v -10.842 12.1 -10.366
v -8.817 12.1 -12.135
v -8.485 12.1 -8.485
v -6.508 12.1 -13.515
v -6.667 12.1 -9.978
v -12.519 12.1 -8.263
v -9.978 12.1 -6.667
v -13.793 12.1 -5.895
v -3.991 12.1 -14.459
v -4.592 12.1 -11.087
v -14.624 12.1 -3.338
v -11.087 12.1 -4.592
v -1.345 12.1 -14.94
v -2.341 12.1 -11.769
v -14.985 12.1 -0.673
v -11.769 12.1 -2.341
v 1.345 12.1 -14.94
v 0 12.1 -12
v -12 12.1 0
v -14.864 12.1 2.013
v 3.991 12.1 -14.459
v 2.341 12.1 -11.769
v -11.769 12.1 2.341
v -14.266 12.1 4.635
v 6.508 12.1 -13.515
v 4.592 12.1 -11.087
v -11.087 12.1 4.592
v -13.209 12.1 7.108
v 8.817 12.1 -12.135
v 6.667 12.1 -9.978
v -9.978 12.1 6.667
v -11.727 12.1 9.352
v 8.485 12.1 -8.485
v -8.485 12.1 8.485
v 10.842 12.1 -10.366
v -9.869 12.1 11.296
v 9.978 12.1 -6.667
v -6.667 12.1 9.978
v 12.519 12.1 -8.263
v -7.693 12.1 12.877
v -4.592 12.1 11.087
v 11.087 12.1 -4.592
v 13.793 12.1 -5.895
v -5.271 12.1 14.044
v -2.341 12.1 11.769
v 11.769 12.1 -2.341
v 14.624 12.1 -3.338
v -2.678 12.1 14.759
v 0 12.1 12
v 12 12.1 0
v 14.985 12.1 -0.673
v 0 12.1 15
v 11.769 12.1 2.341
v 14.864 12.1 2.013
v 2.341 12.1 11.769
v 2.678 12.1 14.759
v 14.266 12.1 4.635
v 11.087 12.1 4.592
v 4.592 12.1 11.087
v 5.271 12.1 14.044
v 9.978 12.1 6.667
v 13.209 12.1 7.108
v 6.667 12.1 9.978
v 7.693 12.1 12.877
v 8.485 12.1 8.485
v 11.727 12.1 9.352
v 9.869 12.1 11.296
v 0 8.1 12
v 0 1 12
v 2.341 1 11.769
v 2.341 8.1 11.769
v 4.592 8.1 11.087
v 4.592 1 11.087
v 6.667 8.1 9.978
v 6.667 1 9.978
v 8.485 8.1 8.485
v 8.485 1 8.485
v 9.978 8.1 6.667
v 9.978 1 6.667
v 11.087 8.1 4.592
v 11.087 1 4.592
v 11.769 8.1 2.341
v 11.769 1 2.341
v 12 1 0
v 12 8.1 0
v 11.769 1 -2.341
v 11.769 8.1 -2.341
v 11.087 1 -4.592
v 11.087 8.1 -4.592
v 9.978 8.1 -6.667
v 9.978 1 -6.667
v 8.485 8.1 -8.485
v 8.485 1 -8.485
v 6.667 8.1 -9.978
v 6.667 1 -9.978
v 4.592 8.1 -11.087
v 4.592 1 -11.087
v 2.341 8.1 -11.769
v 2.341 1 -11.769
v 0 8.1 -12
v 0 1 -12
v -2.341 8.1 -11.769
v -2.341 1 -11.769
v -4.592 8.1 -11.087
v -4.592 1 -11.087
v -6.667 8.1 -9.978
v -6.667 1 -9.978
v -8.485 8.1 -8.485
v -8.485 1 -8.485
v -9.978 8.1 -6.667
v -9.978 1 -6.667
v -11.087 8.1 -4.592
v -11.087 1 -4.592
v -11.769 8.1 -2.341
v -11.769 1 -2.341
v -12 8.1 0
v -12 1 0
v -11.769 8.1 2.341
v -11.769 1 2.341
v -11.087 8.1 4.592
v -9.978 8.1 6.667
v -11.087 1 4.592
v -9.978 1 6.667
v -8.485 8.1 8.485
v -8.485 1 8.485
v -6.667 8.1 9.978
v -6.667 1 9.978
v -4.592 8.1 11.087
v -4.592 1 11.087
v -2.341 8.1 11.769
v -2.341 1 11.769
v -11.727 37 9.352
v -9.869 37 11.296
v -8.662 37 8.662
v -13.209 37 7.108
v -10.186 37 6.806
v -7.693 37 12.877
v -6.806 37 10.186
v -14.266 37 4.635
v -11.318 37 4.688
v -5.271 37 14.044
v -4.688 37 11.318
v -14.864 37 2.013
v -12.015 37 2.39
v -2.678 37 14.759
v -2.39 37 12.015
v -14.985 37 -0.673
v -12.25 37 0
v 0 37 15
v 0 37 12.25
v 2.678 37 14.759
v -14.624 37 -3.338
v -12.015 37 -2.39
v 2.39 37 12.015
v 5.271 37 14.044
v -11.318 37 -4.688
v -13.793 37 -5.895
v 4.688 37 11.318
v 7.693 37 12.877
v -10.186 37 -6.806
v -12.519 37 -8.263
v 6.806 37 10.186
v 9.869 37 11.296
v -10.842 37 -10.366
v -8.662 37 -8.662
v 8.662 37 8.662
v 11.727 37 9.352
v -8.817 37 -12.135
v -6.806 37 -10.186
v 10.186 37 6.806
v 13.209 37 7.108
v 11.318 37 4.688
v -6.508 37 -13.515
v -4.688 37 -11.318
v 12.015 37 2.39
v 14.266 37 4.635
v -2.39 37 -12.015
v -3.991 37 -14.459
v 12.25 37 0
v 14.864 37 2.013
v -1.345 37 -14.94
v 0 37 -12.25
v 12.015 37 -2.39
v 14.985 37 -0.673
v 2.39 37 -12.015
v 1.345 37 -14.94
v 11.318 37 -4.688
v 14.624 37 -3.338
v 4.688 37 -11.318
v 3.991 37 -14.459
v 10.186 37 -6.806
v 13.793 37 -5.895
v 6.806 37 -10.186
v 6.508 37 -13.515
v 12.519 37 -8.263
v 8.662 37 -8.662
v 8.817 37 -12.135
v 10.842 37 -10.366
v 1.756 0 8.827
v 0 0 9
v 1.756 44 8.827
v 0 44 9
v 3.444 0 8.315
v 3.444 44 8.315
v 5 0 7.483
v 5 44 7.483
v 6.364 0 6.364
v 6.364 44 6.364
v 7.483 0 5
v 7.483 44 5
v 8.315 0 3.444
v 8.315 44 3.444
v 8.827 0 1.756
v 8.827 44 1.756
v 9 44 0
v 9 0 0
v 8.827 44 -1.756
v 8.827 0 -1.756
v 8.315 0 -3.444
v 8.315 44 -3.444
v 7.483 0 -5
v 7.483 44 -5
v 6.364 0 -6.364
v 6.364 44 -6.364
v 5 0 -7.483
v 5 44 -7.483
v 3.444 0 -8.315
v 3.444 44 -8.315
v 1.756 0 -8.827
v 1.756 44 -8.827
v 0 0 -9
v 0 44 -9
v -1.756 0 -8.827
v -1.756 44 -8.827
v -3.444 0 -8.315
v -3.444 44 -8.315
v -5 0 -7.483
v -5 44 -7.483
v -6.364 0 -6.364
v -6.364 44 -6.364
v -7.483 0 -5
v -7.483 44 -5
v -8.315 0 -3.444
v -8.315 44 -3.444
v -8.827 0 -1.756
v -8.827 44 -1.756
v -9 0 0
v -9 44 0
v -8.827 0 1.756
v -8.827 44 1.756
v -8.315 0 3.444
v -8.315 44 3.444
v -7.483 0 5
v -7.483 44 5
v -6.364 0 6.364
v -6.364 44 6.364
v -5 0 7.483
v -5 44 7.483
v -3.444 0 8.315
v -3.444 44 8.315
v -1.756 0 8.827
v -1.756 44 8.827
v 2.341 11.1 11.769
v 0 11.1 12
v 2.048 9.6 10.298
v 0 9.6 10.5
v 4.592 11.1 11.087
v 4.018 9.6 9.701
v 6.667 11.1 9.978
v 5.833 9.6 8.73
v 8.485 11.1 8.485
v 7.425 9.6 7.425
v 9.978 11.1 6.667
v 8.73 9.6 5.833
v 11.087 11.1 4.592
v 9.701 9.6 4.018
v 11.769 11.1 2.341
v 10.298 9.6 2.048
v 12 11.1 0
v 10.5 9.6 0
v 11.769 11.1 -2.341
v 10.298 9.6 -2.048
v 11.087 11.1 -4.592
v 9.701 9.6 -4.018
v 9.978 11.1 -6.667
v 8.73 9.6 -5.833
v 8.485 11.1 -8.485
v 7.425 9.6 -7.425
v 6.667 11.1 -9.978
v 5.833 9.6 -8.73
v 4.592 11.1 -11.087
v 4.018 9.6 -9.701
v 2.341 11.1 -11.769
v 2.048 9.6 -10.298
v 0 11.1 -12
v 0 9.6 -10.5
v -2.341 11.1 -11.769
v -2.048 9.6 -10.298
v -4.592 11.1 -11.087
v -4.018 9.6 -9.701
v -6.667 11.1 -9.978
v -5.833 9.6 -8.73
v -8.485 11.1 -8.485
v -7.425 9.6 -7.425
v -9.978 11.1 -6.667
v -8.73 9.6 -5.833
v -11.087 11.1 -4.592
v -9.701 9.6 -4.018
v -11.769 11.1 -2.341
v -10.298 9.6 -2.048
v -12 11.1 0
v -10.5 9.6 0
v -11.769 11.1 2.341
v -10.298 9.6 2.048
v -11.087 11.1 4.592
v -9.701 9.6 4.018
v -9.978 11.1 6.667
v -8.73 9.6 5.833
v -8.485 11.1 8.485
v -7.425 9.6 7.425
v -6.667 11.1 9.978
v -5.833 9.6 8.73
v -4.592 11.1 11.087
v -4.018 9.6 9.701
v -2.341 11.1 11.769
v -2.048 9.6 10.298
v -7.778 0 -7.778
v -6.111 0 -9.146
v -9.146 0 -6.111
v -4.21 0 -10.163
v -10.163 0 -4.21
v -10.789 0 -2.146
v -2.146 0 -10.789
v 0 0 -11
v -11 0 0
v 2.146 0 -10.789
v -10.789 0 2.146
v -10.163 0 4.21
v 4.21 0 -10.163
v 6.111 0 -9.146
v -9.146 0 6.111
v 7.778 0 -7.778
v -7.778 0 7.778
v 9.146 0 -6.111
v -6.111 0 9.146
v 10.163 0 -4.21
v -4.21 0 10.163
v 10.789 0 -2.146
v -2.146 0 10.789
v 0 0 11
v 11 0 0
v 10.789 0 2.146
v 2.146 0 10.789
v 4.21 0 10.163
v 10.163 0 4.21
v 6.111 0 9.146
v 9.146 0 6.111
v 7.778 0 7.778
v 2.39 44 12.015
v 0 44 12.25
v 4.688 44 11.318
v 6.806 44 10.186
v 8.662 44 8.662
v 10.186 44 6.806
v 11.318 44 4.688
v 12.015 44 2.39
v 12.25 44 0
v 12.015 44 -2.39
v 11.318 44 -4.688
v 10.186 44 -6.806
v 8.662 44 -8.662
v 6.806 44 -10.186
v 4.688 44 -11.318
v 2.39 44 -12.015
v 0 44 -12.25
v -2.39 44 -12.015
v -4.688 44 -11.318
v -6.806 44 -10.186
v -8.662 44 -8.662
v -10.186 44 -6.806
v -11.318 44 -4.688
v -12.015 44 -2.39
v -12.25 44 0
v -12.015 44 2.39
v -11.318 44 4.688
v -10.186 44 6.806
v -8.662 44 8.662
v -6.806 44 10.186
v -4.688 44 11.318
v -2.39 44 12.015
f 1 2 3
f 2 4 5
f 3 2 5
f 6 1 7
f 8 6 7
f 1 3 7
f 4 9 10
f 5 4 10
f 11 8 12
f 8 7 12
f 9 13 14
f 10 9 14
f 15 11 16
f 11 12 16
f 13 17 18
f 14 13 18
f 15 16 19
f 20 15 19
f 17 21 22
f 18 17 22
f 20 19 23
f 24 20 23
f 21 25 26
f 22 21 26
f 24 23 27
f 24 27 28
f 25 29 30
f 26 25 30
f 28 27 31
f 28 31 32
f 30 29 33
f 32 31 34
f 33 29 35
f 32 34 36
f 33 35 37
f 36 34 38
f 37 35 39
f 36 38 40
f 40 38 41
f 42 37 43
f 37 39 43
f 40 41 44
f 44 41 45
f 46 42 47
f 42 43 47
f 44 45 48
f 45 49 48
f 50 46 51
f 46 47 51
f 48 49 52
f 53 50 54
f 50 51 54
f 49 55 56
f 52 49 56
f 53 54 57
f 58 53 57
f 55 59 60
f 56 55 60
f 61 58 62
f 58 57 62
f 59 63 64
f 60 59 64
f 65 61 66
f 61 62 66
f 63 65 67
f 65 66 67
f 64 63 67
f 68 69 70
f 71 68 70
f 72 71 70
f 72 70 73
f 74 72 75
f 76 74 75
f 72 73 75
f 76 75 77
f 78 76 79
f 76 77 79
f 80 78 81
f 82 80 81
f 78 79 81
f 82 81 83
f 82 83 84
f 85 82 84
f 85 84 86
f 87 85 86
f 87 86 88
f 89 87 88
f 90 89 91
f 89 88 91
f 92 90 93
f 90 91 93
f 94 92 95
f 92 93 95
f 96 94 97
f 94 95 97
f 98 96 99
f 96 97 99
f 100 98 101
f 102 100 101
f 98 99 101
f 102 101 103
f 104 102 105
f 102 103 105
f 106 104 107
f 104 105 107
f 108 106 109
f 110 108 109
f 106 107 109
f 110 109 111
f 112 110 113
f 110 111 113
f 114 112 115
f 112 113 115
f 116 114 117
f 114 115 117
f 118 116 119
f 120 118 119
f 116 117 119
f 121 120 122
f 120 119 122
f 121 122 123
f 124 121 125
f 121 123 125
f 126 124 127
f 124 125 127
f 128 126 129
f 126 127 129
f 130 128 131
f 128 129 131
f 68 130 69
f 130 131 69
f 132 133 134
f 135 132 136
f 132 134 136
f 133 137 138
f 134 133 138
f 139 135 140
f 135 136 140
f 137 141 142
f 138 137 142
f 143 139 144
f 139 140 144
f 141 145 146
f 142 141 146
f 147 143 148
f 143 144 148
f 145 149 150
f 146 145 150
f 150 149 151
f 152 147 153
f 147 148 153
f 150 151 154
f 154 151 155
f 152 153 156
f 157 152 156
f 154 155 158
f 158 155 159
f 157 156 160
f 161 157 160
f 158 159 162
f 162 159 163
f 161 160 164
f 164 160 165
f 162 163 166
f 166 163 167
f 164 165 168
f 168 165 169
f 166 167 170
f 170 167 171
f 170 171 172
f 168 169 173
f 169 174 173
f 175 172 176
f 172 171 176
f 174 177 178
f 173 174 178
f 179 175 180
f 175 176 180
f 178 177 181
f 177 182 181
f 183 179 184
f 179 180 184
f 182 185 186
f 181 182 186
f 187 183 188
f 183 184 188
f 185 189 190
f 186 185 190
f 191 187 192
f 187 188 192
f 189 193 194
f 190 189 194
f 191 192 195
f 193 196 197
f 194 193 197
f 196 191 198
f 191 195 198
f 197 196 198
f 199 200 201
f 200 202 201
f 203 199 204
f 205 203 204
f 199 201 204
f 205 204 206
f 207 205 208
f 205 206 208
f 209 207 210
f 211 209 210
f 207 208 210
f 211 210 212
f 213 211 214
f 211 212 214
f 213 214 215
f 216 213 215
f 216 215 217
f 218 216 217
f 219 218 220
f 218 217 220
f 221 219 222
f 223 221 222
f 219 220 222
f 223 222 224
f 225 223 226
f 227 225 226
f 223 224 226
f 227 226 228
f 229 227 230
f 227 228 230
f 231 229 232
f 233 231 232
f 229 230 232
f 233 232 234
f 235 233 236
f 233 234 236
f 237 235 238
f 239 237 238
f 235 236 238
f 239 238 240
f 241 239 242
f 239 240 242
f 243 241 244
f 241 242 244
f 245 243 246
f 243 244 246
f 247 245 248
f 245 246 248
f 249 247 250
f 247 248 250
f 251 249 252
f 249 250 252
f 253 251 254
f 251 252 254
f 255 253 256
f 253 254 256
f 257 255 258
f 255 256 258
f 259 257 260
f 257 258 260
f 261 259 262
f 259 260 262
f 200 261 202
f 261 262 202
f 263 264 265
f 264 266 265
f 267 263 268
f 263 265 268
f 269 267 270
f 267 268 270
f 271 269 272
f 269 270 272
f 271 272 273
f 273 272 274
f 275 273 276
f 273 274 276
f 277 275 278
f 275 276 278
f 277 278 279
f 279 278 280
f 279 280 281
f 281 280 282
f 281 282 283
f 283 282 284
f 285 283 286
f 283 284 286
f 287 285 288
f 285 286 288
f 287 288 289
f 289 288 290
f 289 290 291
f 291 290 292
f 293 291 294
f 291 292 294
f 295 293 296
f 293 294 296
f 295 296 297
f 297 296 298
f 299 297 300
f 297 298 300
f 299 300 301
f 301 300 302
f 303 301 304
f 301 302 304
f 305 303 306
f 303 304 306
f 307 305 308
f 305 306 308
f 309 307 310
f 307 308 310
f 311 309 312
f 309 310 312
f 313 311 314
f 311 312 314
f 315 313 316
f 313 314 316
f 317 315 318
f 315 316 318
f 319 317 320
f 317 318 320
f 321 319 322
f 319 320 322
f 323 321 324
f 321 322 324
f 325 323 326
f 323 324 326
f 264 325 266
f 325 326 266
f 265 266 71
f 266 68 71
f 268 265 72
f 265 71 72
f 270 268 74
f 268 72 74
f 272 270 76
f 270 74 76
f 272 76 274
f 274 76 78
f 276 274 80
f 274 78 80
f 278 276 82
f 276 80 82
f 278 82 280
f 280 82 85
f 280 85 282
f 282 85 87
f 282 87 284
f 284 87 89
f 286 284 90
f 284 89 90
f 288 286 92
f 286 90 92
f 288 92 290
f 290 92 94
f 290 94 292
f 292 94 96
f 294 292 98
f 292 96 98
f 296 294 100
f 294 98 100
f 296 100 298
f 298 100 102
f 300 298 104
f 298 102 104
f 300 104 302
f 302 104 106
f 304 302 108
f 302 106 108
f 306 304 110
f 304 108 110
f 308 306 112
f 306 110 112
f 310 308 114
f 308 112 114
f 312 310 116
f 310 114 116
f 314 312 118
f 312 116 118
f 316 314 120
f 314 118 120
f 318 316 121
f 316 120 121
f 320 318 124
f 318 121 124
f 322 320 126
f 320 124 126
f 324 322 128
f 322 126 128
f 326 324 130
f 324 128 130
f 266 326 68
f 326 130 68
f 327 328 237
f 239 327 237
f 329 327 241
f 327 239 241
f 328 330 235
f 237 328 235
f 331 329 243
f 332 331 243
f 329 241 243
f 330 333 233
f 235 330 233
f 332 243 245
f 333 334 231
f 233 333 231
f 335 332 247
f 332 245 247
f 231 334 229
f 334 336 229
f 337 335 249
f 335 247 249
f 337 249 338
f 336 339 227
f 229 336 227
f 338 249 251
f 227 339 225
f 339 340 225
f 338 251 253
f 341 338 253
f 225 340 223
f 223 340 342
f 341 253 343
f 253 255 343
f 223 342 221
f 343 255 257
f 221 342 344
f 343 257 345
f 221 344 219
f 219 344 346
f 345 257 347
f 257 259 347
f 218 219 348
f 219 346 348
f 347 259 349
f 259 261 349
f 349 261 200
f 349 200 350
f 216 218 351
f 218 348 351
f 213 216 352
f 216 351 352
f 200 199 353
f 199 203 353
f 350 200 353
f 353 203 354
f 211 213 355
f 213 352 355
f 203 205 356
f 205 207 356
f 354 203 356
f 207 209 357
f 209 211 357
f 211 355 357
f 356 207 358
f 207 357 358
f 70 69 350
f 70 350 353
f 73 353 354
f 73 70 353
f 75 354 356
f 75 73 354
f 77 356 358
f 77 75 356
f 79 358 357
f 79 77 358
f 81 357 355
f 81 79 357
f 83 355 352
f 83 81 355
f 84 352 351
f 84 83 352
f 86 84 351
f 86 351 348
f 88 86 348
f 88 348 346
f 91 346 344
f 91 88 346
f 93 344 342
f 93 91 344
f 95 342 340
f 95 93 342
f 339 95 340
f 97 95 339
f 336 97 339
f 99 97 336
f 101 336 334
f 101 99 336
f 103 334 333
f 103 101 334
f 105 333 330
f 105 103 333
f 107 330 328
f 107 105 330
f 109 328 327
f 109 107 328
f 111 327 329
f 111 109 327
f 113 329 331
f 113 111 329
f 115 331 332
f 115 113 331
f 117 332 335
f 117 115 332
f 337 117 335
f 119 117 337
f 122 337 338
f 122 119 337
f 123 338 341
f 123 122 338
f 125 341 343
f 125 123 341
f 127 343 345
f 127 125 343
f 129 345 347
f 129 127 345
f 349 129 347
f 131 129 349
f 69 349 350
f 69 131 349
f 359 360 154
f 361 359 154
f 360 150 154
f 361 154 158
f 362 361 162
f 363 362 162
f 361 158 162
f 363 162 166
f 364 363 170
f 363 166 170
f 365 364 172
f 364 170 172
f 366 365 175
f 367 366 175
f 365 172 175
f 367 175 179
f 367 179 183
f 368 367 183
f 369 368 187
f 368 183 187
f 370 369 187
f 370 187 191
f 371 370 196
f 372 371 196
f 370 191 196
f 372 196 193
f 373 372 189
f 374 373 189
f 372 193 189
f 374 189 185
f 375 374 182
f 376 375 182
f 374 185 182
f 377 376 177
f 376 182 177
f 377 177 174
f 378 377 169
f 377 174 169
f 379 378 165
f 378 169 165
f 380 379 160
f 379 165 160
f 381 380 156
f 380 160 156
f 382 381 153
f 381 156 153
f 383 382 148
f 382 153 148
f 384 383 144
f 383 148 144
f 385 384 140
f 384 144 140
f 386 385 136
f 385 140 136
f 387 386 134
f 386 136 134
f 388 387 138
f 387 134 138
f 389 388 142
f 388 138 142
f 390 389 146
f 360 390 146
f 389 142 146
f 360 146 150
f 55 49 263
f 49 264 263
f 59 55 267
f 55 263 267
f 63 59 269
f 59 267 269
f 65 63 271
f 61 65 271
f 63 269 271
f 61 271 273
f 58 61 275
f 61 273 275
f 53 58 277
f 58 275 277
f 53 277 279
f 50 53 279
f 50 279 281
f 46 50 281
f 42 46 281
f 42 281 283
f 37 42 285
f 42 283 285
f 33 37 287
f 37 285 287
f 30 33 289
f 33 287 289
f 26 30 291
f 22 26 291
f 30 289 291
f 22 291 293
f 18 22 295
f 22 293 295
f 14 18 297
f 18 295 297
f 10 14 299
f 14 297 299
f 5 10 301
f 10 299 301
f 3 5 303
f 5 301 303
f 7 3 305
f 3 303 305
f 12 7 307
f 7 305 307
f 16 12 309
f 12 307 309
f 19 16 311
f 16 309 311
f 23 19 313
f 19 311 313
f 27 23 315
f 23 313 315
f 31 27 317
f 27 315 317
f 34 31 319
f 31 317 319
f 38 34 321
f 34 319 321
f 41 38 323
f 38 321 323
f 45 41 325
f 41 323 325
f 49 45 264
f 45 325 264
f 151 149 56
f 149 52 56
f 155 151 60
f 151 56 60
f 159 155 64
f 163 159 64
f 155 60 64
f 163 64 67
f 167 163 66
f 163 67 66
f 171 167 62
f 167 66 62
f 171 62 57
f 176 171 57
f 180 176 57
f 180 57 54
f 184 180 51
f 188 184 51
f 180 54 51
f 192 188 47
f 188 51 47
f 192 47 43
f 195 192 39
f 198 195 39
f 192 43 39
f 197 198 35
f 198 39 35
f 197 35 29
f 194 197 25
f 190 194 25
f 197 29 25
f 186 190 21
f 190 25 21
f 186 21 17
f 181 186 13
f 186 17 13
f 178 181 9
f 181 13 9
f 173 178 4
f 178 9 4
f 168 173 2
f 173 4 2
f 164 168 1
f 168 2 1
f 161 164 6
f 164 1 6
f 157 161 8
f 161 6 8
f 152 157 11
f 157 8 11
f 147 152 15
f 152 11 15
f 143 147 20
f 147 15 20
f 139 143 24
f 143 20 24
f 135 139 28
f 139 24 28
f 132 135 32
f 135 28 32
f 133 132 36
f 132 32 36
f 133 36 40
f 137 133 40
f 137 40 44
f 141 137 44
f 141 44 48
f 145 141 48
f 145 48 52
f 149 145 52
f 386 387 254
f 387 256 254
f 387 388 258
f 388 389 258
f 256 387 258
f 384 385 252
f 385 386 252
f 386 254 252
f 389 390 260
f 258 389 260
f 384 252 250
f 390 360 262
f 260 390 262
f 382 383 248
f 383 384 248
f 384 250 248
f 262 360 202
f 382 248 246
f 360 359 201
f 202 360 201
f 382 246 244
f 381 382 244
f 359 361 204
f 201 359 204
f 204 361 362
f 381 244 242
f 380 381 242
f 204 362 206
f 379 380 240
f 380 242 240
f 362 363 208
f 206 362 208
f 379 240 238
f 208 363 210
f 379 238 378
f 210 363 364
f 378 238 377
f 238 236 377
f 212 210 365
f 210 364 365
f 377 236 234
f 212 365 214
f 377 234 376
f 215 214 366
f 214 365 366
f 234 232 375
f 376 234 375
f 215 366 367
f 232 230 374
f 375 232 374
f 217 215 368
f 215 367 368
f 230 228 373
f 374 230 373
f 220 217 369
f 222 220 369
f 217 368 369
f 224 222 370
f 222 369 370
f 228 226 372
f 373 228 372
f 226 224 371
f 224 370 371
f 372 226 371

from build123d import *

# Parameters (mm, degrees)
F2_SIZE = 1


with BuildPart() as f1:
    # F0 (on Right) → F1 (revolve)
    with BuildSketch(Plane.YZ):
        Polygon((0, 12), (0, 9), (44, 9), (44, 12.25), (37, 12.25), (37, 15), (12.1, 15), (12.1, 12), (11.1, 12), (9.6, 10.5), (8.1, 12), align=None)
    revolve(axis=Axis((0, 15.313713, 0), (0, 1, 0)))

    # F2
    f2_edges = [f1.edges().sort_by_distance(p)[0] for p in [
        (0, 0, -12),
    ]]
    chamfer(f2_edges, length=F2_SIZE)


solid = f1.part
